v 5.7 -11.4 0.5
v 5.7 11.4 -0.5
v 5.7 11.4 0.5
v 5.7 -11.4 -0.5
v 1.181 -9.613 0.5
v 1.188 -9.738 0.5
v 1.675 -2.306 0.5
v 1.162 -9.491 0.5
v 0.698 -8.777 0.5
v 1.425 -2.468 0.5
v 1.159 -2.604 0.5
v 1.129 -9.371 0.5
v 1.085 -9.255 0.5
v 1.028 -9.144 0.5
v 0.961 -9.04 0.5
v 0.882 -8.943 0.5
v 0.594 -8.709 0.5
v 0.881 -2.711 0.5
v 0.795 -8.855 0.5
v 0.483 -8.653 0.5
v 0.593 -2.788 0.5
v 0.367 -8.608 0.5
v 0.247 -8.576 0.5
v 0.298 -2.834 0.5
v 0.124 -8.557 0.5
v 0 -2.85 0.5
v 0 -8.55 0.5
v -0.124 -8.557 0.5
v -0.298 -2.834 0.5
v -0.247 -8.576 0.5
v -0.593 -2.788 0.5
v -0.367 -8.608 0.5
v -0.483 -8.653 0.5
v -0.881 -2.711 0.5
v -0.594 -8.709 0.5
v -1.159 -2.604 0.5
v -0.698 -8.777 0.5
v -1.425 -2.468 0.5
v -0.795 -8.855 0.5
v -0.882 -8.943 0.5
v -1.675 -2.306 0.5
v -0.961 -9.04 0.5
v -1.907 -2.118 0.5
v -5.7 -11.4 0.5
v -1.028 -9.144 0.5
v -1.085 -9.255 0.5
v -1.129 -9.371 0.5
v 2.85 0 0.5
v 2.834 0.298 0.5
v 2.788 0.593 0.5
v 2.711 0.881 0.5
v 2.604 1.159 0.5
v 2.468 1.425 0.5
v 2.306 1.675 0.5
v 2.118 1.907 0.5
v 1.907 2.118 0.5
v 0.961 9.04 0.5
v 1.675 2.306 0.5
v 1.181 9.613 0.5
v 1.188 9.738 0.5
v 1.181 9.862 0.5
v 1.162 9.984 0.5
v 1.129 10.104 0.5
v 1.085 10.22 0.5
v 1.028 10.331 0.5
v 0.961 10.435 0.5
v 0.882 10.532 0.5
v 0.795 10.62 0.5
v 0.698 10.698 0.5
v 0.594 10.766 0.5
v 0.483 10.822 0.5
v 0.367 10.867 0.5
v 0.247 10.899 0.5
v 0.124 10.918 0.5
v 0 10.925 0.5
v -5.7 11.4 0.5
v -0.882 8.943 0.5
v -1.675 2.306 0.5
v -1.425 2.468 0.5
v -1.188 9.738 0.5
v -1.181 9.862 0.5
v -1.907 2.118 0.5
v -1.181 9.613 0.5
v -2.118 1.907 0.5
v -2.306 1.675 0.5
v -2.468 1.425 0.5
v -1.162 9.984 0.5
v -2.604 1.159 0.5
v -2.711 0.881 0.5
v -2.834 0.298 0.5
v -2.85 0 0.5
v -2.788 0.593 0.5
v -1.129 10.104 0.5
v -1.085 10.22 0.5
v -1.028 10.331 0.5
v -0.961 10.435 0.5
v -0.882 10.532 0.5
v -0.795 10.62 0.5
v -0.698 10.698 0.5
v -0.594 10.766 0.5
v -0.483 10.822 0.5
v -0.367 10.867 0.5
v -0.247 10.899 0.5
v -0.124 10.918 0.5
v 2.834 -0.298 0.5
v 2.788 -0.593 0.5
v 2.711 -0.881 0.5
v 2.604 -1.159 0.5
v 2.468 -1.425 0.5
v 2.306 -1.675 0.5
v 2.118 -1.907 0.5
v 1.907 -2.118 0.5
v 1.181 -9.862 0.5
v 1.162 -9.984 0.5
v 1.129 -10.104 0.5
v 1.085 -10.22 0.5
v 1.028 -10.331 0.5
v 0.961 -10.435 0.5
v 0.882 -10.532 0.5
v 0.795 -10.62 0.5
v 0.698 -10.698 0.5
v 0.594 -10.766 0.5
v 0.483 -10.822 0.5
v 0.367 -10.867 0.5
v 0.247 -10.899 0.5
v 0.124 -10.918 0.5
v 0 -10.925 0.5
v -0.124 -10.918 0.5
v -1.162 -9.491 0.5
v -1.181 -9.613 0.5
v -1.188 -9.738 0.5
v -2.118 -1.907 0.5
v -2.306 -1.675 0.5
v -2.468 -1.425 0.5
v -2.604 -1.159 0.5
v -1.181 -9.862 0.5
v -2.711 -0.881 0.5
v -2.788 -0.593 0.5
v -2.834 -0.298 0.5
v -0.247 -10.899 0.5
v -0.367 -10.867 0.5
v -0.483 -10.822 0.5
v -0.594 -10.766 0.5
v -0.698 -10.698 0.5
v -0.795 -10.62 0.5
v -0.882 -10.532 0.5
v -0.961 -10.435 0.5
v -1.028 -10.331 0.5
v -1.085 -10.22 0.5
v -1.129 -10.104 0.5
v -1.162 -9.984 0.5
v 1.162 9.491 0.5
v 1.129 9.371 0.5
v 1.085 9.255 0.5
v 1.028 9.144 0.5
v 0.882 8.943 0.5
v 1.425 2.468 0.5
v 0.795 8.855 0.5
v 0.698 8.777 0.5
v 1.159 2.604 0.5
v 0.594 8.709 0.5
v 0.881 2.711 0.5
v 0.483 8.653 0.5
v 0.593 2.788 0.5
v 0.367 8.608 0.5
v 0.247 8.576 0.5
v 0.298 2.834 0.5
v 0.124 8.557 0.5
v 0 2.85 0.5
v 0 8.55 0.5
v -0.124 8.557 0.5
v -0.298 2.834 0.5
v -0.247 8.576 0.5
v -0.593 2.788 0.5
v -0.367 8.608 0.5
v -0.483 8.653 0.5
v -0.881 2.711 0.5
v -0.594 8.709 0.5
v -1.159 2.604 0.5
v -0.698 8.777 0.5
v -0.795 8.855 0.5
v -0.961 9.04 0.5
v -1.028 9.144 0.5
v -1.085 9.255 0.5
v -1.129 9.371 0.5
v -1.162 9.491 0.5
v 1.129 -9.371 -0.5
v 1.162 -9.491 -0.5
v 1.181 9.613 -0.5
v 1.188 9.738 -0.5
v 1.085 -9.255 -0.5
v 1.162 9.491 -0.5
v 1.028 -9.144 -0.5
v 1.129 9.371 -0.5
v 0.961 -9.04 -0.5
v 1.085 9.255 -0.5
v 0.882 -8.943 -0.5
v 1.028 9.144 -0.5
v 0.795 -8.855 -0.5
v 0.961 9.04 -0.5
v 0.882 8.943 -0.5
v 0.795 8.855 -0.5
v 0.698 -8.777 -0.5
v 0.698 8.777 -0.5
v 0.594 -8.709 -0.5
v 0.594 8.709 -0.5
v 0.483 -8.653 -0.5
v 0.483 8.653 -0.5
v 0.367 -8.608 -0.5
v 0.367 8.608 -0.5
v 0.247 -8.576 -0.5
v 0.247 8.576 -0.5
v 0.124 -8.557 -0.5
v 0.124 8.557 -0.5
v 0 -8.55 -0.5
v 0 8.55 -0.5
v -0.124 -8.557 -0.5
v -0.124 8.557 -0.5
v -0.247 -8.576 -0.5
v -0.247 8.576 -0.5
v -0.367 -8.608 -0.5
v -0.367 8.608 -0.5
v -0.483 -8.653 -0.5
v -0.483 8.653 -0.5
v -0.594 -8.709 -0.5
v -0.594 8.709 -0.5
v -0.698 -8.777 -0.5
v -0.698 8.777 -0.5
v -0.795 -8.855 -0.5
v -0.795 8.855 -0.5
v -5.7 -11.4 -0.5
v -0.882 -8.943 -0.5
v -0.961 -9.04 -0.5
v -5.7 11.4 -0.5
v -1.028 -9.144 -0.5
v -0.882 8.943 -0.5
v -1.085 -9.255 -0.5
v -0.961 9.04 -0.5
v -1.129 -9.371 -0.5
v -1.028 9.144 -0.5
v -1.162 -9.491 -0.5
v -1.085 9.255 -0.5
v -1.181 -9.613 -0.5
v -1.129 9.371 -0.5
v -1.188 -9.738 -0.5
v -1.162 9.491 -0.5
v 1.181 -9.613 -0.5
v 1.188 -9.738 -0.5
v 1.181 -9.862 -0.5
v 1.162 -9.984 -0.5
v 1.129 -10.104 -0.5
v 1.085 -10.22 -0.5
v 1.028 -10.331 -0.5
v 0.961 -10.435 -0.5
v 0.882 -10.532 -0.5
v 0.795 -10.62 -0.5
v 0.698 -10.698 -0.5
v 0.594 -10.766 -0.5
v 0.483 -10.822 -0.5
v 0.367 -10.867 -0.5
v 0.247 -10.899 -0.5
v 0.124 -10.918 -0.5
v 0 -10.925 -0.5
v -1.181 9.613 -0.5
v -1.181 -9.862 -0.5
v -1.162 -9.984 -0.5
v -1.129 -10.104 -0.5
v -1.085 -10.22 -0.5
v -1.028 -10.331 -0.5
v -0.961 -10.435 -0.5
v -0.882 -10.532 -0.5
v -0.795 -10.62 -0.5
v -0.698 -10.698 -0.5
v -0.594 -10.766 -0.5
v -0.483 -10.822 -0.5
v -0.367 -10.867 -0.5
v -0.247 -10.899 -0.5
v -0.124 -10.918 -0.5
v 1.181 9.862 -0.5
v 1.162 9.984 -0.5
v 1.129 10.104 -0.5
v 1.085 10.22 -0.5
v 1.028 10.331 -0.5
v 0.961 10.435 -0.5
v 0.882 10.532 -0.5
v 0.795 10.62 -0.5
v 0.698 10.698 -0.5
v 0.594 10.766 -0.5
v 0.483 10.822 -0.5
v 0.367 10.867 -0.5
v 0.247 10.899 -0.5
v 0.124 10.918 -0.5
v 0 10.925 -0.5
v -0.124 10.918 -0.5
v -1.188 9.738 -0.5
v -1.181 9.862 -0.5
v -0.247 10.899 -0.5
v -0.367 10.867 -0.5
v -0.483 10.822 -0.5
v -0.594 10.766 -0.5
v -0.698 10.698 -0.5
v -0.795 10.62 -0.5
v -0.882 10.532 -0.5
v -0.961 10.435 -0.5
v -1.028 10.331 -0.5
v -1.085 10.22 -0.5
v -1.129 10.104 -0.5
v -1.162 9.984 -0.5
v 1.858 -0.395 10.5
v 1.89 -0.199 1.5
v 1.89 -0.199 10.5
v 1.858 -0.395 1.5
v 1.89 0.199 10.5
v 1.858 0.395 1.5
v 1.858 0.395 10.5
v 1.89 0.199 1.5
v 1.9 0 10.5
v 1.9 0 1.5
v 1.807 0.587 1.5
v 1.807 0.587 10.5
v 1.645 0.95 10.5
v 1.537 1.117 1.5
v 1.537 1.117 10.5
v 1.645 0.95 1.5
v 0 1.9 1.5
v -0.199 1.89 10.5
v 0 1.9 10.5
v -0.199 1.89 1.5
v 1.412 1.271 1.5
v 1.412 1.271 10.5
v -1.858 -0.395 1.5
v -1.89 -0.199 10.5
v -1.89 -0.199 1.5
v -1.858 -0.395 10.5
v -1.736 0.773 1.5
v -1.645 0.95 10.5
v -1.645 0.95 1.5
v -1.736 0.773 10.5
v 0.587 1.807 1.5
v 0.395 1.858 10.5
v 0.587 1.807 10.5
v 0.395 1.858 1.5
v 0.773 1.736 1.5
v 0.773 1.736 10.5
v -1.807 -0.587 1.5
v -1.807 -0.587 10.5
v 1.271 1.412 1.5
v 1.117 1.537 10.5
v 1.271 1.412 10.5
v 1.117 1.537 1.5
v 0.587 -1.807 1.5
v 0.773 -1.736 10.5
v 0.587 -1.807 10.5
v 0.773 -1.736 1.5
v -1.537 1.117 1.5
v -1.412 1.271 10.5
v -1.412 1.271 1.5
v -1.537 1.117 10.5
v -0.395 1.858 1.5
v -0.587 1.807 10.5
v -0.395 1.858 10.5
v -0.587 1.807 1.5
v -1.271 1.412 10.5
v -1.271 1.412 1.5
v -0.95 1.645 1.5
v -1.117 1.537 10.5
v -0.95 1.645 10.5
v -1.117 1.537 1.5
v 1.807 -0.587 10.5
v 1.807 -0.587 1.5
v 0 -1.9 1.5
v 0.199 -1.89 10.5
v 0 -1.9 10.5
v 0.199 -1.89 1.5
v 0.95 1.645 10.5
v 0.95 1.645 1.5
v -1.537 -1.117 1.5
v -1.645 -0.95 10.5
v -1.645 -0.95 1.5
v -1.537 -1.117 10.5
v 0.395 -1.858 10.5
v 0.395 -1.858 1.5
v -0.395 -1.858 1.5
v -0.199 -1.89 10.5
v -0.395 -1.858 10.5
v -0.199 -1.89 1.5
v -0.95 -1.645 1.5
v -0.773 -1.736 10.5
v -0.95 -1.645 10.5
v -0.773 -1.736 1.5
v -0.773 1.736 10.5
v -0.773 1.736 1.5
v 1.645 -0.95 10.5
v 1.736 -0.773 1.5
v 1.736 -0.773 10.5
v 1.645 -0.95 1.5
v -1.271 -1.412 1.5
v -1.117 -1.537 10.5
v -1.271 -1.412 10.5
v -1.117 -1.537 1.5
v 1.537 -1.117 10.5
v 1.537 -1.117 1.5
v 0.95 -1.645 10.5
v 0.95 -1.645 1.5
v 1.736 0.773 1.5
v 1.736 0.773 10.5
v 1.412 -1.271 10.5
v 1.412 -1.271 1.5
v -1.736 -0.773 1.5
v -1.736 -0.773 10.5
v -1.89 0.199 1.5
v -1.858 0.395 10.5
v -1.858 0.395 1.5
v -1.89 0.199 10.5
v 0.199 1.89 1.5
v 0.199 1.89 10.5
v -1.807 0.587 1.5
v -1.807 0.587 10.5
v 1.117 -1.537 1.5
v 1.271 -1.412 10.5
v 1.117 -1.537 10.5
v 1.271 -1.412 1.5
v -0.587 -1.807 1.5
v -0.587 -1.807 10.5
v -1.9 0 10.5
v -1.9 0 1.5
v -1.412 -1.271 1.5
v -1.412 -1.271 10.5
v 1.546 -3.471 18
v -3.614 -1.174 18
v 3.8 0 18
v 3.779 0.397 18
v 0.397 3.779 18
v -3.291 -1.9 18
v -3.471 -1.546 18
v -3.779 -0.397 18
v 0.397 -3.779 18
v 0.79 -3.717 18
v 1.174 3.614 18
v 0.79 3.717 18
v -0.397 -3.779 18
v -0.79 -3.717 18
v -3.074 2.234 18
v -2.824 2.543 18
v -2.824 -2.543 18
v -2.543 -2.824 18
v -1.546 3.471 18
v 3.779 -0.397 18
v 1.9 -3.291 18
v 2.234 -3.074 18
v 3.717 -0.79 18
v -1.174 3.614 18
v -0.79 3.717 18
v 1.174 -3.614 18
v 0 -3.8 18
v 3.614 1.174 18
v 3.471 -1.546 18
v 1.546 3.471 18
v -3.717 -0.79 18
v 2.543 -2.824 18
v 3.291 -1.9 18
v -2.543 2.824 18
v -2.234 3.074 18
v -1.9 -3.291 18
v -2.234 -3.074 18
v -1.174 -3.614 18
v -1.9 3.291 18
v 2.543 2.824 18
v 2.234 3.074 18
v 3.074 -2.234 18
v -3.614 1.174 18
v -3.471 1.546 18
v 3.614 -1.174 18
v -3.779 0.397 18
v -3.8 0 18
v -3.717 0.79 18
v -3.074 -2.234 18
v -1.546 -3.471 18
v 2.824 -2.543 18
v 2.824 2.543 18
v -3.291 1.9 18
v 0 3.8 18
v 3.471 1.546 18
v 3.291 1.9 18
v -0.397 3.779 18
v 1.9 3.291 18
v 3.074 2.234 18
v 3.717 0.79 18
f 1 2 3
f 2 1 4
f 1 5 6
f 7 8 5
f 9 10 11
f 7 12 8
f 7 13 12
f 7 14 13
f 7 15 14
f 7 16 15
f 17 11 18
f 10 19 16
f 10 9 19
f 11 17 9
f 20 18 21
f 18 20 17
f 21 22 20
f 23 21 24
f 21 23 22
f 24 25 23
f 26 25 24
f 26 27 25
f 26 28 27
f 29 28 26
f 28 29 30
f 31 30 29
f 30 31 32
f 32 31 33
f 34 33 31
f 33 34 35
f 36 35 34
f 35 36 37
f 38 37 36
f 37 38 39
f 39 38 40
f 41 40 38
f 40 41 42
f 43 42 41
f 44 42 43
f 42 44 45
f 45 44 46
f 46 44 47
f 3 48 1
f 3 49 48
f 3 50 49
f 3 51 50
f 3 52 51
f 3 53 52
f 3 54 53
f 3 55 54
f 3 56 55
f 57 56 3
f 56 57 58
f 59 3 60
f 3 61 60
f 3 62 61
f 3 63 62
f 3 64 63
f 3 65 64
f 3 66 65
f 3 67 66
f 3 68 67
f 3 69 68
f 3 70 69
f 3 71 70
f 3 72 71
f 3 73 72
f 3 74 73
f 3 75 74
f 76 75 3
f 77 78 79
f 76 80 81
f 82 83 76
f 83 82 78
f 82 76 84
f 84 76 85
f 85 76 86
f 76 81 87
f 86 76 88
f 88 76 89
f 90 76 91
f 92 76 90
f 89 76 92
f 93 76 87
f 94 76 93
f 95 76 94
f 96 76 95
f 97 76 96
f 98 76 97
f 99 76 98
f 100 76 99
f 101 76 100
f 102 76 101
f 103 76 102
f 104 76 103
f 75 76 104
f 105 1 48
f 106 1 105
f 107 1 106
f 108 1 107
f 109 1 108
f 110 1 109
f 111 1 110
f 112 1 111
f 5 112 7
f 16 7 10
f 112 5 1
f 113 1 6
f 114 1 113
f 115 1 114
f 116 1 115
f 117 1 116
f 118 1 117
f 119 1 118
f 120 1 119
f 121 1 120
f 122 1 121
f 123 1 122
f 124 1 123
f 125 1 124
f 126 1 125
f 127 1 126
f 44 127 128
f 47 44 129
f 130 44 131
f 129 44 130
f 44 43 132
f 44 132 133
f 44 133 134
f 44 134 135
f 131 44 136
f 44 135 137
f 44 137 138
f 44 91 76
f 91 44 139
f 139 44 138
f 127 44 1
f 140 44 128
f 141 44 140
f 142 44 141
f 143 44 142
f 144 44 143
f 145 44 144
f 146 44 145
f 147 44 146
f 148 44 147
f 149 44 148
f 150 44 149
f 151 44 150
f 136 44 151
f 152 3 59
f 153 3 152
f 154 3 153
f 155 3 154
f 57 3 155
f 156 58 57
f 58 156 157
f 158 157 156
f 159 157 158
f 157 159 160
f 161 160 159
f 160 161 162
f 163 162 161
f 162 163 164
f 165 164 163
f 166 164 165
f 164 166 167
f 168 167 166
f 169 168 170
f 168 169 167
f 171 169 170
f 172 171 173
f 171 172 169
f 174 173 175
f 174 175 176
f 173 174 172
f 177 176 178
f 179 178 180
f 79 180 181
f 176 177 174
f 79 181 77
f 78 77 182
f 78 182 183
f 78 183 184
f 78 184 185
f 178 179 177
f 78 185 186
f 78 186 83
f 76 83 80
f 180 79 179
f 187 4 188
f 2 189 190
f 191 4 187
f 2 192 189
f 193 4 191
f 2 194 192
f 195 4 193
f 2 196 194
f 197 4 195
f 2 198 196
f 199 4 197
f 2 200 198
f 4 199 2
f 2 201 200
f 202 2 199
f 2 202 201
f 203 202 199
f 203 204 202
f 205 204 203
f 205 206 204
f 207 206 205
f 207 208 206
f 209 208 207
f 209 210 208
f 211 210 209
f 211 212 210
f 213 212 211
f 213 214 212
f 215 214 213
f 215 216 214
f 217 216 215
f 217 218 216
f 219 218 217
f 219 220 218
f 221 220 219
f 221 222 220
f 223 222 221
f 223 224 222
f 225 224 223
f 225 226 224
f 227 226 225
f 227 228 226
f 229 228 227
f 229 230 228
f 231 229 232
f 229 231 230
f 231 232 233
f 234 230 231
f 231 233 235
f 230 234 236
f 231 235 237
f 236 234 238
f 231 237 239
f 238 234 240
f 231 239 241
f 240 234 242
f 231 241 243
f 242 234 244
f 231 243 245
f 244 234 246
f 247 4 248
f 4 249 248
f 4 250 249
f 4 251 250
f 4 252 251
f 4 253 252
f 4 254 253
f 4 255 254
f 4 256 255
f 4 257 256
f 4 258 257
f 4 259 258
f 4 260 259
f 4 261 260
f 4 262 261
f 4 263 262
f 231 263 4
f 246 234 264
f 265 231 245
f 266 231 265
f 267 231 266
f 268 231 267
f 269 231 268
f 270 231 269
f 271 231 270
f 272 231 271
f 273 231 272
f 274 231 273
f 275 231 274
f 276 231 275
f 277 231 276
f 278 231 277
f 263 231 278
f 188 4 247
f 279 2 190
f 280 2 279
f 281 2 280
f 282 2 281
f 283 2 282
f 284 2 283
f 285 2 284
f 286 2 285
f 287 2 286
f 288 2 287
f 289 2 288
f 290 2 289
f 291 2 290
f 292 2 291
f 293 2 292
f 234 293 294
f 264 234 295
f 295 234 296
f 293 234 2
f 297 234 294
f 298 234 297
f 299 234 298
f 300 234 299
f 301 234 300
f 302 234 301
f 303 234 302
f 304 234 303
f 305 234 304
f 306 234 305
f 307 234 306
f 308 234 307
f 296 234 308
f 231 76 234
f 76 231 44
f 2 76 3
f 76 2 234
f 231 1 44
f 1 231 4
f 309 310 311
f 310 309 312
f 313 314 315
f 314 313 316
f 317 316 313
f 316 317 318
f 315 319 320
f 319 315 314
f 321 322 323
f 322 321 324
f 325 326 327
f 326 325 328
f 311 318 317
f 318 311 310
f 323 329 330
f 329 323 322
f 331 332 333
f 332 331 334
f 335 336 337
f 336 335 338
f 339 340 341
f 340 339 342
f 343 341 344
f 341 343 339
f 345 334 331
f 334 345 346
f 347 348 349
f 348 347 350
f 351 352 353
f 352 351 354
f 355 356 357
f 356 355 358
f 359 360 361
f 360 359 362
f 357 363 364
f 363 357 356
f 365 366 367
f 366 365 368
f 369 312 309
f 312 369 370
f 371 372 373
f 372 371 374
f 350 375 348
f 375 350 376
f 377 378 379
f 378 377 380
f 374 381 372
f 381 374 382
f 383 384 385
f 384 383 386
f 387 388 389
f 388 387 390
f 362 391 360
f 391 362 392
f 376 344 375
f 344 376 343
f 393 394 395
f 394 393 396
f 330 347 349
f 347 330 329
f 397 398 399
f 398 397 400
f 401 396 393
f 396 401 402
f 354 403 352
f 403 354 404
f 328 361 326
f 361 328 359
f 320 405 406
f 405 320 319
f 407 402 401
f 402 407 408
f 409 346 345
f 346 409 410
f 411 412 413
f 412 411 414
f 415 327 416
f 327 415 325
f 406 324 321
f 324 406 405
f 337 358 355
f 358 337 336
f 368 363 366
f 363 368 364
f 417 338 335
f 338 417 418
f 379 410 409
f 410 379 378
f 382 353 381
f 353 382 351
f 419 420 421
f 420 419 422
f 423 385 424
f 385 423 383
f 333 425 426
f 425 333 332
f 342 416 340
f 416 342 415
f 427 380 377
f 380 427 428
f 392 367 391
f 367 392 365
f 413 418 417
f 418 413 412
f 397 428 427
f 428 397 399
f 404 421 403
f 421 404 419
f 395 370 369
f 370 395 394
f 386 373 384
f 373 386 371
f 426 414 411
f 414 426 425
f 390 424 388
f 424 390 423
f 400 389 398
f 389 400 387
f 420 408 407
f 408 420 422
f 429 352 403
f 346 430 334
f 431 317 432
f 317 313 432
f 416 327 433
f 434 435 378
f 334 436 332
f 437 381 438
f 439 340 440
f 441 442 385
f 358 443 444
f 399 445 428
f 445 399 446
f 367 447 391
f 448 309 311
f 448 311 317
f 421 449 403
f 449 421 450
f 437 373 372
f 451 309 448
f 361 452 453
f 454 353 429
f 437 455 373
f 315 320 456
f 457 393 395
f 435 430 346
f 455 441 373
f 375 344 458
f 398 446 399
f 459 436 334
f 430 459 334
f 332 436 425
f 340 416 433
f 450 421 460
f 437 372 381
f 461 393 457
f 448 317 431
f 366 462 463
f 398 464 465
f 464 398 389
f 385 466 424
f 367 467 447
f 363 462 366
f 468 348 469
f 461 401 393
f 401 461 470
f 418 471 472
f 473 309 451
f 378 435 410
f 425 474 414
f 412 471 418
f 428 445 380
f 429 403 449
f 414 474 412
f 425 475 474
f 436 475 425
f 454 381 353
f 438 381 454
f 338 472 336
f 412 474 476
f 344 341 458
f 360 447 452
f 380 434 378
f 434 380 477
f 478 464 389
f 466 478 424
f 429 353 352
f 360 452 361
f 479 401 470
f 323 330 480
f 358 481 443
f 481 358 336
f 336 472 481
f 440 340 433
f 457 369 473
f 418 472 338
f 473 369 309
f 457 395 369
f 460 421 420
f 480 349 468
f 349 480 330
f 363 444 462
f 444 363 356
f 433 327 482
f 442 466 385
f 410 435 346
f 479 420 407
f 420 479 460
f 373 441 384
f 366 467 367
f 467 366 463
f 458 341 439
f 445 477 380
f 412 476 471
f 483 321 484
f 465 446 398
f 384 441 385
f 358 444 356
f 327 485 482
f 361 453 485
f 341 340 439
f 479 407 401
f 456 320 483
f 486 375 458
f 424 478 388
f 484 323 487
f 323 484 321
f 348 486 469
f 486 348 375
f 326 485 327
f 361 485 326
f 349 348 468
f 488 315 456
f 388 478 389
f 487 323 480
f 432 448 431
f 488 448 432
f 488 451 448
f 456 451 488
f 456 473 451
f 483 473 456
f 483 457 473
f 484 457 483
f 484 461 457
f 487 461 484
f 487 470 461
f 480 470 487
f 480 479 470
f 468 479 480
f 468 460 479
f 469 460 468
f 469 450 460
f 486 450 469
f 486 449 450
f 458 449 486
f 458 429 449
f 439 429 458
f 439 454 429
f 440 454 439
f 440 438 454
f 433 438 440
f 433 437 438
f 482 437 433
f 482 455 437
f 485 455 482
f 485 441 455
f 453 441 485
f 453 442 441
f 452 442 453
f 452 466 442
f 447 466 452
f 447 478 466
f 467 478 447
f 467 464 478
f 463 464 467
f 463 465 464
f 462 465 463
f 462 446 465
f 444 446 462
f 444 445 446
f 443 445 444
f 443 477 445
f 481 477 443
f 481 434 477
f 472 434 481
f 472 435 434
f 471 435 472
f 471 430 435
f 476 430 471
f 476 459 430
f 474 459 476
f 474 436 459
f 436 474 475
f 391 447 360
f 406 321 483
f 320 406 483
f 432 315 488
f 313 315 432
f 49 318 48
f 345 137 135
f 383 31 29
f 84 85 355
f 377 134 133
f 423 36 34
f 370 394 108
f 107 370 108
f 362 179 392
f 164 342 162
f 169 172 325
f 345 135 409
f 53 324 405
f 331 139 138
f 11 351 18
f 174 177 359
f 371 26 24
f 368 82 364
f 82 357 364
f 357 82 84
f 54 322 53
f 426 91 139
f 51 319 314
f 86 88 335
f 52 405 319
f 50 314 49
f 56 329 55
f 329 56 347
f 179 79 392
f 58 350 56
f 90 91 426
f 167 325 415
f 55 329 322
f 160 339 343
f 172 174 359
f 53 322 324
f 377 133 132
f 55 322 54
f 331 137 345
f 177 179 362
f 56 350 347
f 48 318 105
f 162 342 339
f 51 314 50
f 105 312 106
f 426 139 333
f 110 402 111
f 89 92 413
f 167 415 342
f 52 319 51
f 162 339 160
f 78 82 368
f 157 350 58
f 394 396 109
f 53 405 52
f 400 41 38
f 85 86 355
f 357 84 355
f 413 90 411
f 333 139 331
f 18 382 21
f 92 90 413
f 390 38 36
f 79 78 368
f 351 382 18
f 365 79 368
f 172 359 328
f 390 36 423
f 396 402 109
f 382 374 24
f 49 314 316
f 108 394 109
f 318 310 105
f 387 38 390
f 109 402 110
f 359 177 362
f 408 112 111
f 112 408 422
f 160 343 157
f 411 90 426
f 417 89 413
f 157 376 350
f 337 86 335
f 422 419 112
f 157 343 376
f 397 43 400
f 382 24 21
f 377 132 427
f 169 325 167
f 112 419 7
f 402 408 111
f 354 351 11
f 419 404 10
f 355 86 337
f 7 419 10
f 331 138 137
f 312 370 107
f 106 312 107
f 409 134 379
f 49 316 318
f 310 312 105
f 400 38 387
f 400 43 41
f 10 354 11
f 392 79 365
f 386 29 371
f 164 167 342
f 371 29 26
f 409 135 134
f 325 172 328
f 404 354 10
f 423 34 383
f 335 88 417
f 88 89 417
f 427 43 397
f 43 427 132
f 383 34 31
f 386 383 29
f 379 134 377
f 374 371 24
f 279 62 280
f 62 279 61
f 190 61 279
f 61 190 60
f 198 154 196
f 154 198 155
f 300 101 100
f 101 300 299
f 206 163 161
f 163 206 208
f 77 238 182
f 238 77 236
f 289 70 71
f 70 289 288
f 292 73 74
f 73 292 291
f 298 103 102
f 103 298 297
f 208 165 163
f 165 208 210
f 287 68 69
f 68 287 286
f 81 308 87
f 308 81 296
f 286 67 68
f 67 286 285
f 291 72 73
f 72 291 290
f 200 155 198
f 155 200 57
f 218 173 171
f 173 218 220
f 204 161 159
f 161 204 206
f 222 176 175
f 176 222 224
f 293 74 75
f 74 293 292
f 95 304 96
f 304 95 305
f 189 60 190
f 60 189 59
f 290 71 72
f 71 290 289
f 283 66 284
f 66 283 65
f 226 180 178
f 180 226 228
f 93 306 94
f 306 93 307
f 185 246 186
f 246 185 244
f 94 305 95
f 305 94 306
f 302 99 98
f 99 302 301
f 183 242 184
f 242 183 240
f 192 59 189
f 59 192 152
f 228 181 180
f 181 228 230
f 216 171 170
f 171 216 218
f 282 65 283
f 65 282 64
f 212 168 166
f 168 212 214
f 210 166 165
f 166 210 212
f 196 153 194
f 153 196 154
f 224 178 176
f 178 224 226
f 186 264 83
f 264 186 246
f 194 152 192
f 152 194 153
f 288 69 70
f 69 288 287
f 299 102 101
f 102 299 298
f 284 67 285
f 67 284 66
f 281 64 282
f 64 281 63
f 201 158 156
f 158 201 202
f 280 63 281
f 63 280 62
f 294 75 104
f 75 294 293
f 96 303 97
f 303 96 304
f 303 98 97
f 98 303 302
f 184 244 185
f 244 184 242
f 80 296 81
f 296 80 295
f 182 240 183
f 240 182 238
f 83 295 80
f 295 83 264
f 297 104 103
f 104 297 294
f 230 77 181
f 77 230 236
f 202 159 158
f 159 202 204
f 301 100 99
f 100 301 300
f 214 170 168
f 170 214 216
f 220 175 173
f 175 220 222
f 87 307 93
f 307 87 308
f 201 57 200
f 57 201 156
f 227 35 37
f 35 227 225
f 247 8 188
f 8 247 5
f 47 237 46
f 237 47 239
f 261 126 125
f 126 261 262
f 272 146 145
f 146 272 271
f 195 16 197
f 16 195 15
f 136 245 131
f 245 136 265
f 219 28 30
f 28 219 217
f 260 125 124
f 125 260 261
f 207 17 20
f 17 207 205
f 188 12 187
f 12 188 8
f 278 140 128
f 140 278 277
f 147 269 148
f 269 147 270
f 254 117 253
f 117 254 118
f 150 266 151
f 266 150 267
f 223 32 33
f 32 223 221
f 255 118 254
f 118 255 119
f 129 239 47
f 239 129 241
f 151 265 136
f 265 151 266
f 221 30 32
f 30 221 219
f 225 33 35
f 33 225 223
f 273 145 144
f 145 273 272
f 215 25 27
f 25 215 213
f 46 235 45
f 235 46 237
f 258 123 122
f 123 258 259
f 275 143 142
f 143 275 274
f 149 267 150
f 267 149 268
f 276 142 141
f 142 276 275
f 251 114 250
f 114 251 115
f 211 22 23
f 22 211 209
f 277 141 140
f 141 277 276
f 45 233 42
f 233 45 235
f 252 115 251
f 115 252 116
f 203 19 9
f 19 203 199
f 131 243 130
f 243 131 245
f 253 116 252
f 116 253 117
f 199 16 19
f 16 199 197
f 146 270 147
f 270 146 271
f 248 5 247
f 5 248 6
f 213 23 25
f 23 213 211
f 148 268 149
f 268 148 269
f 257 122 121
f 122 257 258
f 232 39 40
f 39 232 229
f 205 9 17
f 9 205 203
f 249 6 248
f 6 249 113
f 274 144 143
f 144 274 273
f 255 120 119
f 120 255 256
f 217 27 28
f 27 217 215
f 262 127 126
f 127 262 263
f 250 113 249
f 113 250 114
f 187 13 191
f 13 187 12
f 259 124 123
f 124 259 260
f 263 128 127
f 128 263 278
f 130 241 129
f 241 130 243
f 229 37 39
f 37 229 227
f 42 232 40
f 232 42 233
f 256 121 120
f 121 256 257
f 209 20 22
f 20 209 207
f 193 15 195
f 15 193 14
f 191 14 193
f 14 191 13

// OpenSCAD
$fn=60;


module pcb()
{
  color("Green") cube([9,16,1.8], center=true);
}

module inside()
{
  color("Purple") cube([10,16,8], center=true);
}


module screw_holes(radius=1.25)
{
#  translate([0,(24-3.5)/2,0]) cylinder(h=2.5,r=radius,center=true);
  rotate([0,0,180]) translate([0,(24-3.5)/2,0]) cylinder(h=2.5,r=radius,center=true);
}

module light_hoods()
{
  difference()
  {
    cylinder(h=1,r=2,center=true);
//    cylinder(h=5,r=1.5,center=true);
    translate([0,0,1]) rotate([-25,0,0]) cylinder(h=2,r1=3,r2=3,center=true);
  }

}


module top()
{
  difference()
  {
    union()
    {
      cube([12,24,9], center=true);
      translate([0,0,5])
      {
        // Light holes hoods    
 //       translate([0,0,0]) light_hoods();
 //       translate([0,5,0])  light_hoods();
 //       translate([0,-5,0]) light_hoods();
        difference()
        {
          translate([0,0,-0.25]) cube([12,24,0.5], center=true);
          cube([6,18,2], center=true);
        }
      }
    }
    translate([0,0,0.5]) cube([10,22,6], center=true);
    translate([0,0,-1]) cube([10,17,9], center=true);
    translate([0,0,-1]) cube([10,17,9], center=true);
    // Screw holes
 #   translate([0,0,-3.75]) screw_holes(radius=0.80);
    // Light holes
    translate([0,0,5]) cylinder(h=5,r=1.25,center=true);
    translate([0,5,5])  cylinder(h=5,r=1.25,center=true);
    translate([0,-5,5]) cylinder(h=5,r=1.25,center=true);
    // Button hole
    translate([0,12,1]) cube([6,5,3], center=true);

  }
  // thin layer to support hoods
//  translate([0,0,3.5-0.1]) cube([12,24,0.2], center=true);

}

module bottom()
{
  // base is "squeezed" by brim 
  scale([0.95, 0.95,1])  difference()
  {
    union()
    {
      // scale as bottom is not rotated
      cube([12,24,1], center=true);
      translate([0,0,(10+1)/2]) cylinder(h=10,r=2,center=true);
      translate([0,0,(10+1/2+7.5/2)]) cylinder(h=7.5,r1=2, r2=4,center=true);
      translate([0,0,1]) cylinder(h=1,r1=3, r2=2,center=true);
    }
  translate([0,0,0]) screw_holes();
  }
}

difference()
{
  union()
  {
//    bottom();
    top();
//    pcb();
   //translate([0,0,-0.5]) inside();
  }
  translate([0,0,-50]) cube([100,100,100]);
}


//!rotate([-90,0,0]) top();
!bottom();
